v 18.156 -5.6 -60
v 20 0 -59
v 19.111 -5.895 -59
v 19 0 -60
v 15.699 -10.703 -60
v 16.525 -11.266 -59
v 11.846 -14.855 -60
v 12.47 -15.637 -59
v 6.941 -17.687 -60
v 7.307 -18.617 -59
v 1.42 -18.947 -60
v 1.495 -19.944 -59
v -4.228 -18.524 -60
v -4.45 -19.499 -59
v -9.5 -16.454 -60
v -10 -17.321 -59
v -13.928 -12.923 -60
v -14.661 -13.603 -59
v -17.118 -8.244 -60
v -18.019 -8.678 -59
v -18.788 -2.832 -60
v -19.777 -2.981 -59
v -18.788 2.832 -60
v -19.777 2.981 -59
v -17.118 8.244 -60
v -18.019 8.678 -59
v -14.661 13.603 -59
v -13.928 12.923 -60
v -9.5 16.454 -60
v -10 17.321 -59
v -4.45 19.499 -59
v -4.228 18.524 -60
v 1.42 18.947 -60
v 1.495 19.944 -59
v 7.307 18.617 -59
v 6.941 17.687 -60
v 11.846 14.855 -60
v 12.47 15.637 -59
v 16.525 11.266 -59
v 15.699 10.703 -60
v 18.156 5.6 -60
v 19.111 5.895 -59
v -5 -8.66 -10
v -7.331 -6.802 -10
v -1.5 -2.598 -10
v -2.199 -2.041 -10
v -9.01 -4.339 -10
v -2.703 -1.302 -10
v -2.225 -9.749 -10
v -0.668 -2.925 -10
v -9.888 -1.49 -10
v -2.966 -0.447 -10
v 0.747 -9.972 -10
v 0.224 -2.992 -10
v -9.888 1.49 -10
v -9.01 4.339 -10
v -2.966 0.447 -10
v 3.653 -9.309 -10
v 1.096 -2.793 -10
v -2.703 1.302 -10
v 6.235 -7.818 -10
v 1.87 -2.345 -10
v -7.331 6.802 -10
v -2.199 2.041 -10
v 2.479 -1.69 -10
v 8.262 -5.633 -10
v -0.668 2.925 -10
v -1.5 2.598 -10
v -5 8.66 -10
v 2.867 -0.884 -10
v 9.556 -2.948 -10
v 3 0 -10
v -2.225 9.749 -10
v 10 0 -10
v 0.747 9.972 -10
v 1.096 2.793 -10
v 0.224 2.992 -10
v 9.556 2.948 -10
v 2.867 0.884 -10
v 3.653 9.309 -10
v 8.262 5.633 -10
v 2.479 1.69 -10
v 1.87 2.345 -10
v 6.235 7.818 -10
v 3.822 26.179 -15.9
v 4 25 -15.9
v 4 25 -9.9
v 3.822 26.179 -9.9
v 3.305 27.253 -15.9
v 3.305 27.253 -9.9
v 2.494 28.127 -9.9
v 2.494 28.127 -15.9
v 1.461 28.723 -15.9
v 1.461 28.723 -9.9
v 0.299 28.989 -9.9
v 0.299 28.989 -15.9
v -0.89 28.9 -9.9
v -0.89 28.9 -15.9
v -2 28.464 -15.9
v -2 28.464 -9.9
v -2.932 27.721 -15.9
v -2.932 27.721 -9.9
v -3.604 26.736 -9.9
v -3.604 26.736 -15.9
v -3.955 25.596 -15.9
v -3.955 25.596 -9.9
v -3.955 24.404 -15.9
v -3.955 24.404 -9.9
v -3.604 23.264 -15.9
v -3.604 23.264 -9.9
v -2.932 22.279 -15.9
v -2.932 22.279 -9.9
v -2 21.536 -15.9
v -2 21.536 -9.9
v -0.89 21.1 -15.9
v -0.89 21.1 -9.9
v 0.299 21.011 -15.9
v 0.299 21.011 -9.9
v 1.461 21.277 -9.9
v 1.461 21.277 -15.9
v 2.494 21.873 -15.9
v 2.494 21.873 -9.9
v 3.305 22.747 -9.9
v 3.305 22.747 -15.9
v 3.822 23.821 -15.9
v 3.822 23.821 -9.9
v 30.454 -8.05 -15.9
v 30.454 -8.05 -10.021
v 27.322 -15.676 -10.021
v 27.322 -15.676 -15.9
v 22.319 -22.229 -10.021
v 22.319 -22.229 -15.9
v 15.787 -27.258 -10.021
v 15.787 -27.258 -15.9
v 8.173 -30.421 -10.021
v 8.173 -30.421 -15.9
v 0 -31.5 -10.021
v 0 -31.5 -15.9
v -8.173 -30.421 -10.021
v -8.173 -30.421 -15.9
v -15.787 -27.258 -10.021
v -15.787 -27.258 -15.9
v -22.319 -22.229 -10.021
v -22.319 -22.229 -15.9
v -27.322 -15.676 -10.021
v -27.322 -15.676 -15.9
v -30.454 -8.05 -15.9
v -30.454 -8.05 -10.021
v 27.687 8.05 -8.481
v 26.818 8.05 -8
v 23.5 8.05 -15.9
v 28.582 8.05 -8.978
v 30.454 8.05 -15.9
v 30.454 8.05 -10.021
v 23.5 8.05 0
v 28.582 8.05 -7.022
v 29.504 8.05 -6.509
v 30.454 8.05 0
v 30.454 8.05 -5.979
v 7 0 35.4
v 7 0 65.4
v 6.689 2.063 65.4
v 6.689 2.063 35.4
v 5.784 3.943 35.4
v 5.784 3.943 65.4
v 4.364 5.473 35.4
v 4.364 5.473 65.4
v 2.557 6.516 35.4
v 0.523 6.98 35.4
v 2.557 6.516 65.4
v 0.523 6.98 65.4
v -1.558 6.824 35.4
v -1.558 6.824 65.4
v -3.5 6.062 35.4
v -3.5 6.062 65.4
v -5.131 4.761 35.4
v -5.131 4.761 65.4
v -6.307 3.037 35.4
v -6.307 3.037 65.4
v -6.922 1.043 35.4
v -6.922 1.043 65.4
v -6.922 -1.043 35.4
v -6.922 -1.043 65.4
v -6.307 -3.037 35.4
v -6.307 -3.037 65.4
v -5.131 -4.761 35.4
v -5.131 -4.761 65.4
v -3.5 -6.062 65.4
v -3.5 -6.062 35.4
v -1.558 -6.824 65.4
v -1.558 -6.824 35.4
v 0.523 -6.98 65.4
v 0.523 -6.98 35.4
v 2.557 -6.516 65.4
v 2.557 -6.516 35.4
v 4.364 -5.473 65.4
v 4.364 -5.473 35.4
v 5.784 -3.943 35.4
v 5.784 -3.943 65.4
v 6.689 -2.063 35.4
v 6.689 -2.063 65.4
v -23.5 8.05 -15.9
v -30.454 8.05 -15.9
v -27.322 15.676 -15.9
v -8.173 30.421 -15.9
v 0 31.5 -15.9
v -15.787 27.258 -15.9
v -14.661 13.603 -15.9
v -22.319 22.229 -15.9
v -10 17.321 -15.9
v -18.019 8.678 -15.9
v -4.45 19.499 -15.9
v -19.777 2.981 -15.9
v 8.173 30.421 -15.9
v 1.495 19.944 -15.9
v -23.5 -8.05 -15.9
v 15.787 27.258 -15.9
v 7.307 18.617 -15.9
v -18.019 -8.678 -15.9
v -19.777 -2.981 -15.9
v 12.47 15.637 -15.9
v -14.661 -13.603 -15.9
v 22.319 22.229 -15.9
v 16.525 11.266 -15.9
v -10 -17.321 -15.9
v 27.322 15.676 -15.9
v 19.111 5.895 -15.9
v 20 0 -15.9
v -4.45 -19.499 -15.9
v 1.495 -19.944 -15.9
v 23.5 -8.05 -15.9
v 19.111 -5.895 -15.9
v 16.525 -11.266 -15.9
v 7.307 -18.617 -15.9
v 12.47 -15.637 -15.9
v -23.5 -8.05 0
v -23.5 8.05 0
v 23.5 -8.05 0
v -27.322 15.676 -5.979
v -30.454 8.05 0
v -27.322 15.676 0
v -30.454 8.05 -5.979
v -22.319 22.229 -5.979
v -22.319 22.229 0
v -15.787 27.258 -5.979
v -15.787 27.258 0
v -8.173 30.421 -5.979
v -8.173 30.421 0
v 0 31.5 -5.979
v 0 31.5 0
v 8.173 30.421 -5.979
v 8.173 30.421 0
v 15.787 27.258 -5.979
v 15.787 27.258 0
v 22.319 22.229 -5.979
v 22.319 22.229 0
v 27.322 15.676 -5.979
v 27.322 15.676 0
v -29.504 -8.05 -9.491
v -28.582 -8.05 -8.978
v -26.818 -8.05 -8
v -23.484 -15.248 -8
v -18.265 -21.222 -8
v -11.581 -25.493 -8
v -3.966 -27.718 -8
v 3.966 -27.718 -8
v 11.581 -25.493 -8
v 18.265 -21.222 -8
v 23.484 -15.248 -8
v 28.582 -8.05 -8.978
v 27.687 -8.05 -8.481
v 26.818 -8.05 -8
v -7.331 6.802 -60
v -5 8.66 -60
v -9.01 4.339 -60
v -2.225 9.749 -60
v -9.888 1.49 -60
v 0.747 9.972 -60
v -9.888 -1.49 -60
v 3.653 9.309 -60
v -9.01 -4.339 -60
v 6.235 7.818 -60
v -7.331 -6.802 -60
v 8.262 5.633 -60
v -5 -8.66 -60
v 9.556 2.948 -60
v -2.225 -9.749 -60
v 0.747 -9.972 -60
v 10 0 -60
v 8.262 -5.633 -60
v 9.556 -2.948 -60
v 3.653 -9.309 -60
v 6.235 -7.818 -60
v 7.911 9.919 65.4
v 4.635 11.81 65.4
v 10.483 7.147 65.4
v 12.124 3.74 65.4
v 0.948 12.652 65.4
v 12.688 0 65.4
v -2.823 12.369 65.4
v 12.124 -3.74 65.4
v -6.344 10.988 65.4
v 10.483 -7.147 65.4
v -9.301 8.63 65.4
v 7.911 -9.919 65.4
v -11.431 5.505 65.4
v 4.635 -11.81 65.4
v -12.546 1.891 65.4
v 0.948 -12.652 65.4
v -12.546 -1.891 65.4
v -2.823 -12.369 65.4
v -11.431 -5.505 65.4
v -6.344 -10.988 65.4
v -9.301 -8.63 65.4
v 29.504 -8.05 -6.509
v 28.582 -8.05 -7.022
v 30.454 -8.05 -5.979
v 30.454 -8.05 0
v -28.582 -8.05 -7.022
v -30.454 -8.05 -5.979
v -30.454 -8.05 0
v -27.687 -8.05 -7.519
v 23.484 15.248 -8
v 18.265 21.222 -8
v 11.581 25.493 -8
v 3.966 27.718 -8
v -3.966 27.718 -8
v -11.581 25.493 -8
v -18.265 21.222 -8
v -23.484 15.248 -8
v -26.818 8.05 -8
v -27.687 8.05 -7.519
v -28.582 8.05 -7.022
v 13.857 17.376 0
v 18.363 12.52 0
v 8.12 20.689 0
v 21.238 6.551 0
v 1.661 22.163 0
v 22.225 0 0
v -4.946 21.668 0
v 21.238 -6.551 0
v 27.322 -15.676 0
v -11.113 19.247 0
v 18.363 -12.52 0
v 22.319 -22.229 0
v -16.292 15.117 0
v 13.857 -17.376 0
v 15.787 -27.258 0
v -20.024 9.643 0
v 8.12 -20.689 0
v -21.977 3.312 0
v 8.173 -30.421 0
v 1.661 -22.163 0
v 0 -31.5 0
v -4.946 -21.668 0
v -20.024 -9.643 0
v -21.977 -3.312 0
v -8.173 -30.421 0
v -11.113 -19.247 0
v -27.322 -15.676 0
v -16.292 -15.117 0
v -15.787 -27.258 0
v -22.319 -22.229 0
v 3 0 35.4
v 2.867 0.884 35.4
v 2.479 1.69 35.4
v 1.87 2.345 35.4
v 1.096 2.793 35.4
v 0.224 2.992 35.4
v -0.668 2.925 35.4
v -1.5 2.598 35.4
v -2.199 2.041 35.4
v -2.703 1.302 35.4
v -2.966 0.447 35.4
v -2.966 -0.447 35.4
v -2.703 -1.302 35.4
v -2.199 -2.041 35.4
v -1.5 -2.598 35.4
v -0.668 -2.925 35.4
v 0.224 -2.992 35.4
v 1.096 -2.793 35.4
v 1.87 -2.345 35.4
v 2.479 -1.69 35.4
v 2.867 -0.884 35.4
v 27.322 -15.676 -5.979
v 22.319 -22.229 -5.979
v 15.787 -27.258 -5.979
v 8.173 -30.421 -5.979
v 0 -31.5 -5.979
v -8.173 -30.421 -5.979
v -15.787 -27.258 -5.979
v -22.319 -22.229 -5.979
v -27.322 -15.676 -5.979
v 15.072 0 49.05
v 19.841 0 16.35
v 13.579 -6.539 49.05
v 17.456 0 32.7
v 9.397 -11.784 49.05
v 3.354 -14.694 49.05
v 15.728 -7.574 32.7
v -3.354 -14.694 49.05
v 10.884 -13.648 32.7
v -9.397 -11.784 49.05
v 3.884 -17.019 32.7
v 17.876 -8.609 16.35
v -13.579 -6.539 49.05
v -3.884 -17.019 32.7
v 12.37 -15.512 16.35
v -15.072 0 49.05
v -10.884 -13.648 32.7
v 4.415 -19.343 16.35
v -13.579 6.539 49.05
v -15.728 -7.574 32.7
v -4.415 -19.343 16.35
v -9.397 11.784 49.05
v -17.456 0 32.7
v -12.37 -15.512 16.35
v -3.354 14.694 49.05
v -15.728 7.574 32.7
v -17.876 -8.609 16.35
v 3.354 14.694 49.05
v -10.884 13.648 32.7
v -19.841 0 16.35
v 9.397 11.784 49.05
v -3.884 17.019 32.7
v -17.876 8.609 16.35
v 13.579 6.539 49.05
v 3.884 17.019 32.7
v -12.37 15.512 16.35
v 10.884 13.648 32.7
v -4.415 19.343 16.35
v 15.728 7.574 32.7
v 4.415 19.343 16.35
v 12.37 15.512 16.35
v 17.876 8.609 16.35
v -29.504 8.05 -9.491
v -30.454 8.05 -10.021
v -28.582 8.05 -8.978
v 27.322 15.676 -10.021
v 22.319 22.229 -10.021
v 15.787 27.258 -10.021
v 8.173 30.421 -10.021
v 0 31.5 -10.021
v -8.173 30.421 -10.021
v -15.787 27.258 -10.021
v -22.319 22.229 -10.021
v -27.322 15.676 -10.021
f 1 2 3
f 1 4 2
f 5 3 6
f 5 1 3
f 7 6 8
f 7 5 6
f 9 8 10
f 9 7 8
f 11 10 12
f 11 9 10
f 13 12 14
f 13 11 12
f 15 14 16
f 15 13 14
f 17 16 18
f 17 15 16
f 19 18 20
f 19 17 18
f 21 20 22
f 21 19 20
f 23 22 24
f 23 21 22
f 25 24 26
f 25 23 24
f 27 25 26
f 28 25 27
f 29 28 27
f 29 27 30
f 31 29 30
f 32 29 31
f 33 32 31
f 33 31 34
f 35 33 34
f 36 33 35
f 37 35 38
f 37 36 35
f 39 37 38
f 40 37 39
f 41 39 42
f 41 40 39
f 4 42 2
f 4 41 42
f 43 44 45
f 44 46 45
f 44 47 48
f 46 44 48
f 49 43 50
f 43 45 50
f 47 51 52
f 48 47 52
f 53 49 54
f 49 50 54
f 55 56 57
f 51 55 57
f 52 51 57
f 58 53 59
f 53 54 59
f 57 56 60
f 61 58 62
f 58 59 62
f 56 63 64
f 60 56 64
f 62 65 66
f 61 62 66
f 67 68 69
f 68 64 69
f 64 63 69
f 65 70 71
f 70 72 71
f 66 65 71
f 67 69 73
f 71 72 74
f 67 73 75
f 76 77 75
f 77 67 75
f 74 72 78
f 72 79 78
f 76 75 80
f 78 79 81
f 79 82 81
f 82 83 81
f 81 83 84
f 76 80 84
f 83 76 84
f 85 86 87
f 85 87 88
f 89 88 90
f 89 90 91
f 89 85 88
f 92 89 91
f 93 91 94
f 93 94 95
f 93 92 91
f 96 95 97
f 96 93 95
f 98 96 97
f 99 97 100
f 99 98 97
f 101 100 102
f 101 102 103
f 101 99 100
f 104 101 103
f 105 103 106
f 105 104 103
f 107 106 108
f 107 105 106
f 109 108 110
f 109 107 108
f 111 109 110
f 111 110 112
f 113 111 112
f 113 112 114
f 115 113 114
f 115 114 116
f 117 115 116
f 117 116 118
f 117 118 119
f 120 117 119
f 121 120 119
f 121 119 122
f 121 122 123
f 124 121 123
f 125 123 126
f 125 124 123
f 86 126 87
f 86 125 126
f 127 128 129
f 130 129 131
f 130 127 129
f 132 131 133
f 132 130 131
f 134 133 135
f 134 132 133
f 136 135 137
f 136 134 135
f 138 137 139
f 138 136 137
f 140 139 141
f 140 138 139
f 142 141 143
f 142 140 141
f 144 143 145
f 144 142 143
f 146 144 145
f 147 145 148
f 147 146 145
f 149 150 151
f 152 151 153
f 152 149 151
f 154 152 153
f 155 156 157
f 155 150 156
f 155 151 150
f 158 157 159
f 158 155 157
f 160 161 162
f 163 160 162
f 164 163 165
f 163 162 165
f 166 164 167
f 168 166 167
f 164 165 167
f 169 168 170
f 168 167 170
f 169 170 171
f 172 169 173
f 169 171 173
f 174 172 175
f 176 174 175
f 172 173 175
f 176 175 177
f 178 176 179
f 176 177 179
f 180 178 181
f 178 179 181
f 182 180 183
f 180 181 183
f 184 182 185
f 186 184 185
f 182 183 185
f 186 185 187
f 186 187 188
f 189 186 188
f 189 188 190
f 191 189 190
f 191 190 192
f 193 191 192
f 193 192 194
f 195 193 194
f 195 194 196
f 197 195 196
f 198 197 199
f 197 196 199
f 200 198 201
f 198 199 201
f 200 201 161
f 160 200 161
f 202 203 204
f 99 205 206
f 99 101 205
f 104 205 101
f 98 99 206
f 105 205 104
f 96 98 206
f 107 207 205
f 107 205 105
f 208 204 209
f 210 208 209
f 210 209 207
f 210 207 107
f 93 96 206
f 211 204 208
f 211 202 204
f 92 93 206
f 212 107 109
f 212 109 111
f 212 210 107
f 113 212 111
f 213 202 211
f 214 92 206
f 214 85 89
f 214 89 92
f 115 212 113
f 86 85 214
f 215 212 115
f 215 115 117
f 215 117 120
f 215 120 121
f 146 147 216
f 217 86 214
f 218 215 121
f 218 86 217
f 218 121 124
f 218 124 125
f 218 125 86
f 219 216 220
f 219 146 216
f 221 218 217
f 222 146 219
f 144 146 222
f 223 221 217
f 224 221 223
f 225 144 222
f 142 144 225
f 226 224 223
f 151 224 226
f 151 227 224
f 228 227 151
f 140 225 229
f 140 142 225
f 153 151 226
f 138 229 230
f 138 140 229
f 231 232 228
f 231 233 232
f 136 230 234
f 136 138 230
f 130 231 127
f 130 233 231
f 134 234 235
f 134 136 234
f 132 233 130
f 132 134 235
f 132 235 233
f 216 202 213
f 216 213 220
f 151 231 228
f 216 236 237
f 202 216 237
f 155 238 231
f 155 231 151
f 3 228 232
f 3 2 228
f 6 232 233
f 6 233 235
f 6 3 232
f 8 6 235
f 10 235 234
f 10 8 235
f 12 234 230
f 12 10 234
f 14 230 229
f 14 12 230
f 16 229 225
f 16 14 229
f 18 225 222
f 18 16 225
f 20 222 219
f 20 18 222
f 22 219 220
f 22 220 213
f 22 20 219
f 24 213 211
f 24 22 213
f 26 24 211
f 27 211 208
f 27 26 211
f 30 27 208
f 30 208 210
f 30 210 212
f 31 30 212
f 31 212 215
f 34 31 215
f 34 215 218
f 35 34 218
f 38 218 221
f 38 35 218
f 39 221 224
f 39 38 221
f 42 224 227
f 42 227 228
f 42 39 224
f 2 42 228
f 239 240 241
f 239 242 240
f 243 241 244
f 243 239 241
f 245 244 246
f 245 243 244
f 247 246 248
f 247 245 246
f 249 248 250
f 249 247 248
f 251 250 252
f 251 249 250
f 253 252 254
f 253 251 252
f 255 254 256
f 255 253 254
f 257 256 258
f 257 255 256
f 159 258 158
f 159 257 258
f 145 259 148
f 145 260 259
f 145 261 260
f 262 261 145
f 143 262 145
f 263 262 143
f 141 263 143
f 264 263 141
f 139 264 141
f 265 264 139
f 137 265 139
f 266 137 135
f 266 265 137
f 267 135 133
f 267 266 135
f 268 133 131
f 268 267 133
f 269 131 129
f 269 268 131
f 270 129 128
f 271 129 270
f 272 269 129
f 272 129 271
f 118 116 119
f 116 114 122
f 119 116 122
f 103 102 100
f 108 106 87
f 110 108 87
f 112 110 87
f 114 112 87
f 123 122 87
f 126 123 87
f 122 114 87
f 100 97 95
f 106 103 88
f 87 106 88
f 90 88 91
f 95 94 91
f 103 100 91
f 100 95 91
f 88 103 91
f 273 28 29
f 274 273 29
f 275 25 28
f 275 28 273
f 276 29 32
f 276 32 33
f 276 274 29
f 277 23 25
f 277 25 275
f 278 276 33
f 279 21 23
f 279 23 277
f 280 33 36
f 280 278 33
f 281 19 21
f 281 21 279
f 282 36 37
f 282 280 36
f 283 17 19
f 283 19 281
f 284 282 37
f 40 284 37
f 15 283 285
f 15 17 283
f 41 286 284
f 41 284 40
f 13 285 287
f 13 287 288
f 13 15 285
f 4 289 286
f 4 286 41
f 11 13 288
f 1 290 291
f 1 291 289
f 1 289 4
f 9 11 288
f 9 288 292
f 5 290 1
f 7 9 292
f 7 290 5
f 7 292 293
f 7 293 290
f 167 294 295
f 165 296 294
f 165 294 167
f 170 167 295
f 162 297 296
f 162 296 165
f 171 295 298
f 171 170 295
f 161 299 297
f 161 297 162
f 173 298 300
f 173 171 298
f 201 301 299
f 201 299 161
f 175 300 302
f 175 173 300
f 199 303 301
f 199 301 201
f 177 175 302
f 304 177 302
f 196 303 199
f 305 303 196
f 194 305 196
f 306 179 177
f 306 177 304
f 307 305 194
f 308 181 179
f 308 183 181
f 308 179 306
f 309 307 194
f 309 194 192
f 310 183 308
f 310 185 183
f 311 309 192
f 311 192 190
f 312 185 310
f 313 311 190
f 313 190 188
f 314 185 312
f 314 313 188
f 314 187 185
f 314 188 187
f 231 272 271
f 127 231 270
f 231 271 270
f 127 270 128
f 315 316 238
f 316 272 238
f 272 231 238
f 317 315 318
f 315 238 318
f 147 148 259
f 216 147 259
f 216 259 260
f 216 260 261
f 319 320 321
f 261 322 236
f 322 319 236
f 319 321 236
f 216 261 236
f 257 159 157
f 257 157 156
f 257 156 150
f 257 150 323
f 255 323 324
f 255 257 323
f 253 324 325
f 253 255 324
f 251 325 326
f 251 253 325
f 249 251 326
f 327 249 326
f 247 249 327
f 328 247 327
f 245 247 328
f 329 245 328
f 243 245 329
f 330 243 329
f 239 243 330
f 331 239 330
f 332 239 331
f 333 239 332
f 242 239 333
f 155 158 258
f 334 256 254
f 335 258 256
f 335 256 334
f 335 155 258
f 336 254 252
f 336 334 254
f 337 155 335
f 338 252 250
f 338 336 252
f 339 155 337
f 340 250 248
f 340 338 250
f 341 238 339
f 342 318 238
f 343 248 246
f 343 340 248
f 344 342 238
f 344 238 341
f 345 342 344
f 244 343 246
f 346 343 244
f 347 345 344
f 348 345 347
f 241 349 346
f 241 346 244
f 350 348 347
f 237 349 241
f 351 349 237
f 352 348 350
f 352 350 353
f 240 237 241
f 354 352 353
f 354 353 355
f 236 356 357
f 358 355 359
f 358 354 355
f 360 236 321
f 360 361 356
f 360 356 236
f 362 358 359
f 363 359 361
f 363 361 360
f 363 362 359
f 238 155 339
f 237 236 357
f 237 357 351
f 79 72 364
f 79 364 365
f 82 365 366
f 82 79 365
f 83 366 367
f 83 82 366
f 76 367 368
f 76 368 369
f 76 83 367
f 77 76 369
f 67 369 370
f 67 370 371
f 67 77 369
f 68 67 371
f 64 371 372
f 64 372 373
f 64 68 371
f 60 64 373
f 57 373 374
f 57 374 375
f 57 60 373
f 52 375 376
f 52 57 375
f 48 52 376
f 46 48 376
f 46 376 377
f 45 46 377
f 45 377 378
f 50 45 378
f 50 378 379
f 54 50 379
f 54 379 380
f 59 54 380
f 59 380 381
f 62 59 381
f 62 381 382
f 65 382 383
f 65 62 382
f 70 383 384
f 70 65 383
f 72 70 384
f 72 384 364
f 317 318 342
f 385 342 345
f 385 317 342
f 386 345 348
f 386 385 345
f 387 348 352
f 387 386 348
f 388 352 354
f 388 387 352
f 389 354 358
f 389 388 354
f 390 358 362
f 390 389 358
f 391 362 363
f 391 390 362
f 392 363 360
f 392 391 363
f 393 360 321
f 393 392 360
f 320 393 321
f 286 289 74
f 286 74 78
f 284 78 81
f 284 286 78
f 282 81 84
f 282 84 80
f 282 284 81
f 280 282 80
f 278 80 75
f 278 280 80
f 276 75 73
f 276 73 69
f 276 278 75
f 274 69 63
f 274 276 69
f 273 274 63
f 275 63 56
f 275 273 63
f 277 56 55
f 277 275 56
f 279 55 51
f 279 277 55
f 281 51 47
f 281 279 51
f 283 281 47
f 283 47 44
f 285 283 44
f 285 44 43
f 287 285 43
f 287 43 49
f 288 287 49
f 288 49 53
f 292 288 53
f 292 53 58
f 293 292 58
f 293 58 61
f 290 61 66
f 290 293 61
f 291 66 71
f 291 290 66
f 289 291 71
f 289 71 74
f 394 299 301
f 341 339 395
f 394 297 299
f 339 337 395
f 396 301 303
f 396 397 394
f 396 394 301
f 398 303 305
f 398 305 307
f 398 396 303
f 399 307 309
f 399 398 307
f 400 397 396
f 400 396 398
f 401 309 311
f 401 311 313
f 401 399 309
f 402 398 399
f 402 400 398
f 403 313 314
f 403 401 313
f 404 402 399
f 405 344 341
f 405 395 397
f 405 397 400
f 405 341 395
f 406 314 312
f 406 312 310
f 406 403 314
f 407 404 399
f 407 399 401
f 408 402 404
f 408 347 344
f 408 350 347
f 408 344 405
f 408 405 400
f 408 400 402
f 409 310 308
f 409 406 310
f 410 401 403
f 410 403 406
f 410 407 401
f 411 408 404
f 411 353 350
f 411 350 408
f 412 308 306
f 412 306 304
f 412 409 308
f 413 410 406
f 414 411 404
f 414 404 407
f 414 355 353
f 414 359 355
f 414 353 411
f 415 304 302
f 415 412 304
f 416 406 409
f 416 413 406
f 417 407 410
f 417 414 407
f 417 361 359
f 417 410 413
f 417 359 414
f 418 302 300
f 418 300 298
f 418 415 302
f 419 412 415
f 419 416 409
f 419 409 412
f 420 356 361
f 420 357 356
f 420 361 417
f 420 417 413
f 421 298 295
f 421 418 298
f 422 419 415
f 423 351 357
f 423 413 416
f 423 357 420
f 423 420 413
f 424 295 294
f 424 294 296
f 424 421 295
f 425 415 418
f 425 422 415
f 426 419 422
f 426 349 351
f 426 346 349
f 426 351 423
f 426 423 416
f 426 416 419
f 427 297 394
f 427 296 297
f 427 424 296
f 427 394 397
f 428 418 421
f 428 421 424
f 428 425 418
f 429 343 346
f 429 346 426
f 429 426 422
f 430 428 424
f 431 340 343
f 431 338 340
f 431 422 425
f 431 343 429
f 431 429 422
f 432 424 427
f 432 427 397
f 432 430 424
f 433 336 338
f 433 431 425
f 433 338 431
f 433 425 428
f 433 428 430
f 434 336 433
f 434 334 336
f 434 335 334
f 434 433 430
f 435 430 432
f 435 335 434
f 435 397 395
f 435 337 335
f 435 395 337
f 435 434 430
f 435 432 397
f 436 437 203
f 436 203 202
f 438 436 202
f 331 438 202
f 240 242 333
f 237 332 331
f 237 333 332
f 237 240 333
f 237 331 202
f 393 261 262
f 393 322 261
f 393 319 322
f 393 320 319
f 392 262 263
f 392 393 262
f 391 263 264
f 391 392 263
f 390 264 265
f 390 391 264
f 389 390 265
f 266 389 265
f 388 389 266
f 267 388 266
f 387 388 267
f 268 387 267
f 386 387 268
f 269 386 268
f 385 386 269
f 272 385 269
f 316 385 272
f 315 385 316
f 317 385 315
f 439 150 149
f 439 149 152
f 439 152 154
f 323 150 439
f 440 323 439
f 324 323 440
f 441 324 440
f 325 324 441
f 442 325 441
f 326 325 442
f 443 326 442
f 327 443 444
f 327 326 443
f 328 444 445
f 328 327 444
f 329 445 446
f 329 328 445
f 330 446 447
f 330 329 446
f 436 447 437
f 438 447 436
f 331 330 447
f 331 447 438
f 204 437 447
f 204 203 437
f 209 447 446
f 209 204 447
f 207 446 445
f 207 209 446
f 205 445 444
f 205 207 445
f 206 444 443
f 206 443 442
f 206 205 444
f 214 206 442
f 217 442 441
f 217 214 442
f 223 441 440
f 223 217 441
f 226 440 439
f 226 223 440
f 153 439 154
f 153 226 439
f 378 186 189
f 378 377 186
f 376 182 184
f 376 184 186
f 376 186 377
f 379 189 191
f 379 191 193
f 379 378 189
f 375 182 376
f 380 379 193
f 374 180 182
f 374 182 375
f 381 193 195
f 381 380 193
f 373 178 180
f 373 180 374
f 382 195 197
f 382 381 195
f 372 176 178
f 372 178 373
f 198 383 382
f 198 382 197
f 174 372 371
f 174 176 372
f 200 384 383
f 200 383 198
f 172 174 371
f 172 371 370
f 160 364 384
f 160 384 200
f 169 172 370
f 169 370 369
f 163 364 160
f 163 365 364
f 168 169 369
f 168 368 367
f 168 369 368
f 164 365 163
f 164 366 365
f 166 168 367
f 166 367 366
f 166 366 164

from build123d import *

# Parameters (mm, degrees)
SKETCH_3_W          = 9.5
SKETCH_3_H          = 16.1
CUT_EXTRUDE_1_DEPTH = 80.130651457
SKETCH_4_R          = 4
CUT_EXTRUDE_2_DEPTH = 6
SKETCH_5_R          = 10
CUT_EXTRUDE_3_DEPTH = 50
SKETCH_6_R          = 7
CUT_EXTRUDE_4_DEPTH = 30
SKETCH_7_R          = 3
CUT_EXTRUDE_5_DEPTH = 45.4


with BuildPart() as part:
    # 草图1 → 旋转1 (revolve)
    with BuildSketch(Plane(origin=(0, 0, 0), x_dir=(1, 0, 0), z_dir=(0, 1, 0))):
        Polygon((0, -65.4), (12.6875, -65.4), (22.225, 0), (31.5, 0), (31.5, 15.9), (20, 15.9), (20, 59), (19, 60), (0, 60), align=None)
    revolve(axis=Axis((0, 0, 65.4), (0, 0, -1)))

    # 草图2 → 切除-旋转1 (revolve, cut)
    with BuildSketch(Plane(origin=(0, 0, 0), x_dir=(1, 0, 0), z_dir=(0, 1, 0))):
        Polygon((28, 8), (32, 5.6906), (32, 10.3094), align=None)
    revolve(axis=Axis((0, 0, 0), (0, 0, 1)), mode=Mode.SUBTRACT)

    # 草图3 → 切除-拉伸1 (cut, through all)
    with BuildSketch(Plane.XY):
        with Locations((28.25, 0)):
            Rectangle(SKETCH_3_W, SKETCH_3_H)
        with Locations((-28.25, 0)):
            Rectangle(SKETCH_3_W, SKETCH_3_H)
    extrude(amount=-CUT_EXTRUDE_1_DEPTH, mode=Mode.SUBTRACT)

    # 草图4 → 切除-拉伸2 (cut)
    with BuildSketch(Plane.XY.offset(-15.9)):
        with Locations((0, 25)):
            Circle(SKETCH_4_R)
    extrude(amount=CUT_EXTRUDE_2_DEPTH, mode=Mode.SUBTRACT)

    # 草图5 → 切除-拉伸3 (cut)
    with BuildSketch(Plane.XY.offset(-60)):
        Circle(SKETCH_5_R)
    extrude(amount=CUT_EXTRUDE_3_DEPTH, mode=Mode.SUBTRACT)

    # 草图6 → 切除-拉伸4 (cut)
    with BuildSketch(Plane.XY.offset(65.4)):
        Circle(SKETCH_6_R)
    extrude(amount=-CUT_EXTRUDE_4_DEPTH, mode=Mode.SUBTRACT)

    # 草图7 → 切除-拉伸5 (cut)
    with BuildSketch(Plane.XY.offset(-10)):
        Circle(SKETCH_7_R)
    extrude(amount=CUT_EXTRUDE_5_DEPTH, mode=Mode.SUBTRACT)


solid = part.part
